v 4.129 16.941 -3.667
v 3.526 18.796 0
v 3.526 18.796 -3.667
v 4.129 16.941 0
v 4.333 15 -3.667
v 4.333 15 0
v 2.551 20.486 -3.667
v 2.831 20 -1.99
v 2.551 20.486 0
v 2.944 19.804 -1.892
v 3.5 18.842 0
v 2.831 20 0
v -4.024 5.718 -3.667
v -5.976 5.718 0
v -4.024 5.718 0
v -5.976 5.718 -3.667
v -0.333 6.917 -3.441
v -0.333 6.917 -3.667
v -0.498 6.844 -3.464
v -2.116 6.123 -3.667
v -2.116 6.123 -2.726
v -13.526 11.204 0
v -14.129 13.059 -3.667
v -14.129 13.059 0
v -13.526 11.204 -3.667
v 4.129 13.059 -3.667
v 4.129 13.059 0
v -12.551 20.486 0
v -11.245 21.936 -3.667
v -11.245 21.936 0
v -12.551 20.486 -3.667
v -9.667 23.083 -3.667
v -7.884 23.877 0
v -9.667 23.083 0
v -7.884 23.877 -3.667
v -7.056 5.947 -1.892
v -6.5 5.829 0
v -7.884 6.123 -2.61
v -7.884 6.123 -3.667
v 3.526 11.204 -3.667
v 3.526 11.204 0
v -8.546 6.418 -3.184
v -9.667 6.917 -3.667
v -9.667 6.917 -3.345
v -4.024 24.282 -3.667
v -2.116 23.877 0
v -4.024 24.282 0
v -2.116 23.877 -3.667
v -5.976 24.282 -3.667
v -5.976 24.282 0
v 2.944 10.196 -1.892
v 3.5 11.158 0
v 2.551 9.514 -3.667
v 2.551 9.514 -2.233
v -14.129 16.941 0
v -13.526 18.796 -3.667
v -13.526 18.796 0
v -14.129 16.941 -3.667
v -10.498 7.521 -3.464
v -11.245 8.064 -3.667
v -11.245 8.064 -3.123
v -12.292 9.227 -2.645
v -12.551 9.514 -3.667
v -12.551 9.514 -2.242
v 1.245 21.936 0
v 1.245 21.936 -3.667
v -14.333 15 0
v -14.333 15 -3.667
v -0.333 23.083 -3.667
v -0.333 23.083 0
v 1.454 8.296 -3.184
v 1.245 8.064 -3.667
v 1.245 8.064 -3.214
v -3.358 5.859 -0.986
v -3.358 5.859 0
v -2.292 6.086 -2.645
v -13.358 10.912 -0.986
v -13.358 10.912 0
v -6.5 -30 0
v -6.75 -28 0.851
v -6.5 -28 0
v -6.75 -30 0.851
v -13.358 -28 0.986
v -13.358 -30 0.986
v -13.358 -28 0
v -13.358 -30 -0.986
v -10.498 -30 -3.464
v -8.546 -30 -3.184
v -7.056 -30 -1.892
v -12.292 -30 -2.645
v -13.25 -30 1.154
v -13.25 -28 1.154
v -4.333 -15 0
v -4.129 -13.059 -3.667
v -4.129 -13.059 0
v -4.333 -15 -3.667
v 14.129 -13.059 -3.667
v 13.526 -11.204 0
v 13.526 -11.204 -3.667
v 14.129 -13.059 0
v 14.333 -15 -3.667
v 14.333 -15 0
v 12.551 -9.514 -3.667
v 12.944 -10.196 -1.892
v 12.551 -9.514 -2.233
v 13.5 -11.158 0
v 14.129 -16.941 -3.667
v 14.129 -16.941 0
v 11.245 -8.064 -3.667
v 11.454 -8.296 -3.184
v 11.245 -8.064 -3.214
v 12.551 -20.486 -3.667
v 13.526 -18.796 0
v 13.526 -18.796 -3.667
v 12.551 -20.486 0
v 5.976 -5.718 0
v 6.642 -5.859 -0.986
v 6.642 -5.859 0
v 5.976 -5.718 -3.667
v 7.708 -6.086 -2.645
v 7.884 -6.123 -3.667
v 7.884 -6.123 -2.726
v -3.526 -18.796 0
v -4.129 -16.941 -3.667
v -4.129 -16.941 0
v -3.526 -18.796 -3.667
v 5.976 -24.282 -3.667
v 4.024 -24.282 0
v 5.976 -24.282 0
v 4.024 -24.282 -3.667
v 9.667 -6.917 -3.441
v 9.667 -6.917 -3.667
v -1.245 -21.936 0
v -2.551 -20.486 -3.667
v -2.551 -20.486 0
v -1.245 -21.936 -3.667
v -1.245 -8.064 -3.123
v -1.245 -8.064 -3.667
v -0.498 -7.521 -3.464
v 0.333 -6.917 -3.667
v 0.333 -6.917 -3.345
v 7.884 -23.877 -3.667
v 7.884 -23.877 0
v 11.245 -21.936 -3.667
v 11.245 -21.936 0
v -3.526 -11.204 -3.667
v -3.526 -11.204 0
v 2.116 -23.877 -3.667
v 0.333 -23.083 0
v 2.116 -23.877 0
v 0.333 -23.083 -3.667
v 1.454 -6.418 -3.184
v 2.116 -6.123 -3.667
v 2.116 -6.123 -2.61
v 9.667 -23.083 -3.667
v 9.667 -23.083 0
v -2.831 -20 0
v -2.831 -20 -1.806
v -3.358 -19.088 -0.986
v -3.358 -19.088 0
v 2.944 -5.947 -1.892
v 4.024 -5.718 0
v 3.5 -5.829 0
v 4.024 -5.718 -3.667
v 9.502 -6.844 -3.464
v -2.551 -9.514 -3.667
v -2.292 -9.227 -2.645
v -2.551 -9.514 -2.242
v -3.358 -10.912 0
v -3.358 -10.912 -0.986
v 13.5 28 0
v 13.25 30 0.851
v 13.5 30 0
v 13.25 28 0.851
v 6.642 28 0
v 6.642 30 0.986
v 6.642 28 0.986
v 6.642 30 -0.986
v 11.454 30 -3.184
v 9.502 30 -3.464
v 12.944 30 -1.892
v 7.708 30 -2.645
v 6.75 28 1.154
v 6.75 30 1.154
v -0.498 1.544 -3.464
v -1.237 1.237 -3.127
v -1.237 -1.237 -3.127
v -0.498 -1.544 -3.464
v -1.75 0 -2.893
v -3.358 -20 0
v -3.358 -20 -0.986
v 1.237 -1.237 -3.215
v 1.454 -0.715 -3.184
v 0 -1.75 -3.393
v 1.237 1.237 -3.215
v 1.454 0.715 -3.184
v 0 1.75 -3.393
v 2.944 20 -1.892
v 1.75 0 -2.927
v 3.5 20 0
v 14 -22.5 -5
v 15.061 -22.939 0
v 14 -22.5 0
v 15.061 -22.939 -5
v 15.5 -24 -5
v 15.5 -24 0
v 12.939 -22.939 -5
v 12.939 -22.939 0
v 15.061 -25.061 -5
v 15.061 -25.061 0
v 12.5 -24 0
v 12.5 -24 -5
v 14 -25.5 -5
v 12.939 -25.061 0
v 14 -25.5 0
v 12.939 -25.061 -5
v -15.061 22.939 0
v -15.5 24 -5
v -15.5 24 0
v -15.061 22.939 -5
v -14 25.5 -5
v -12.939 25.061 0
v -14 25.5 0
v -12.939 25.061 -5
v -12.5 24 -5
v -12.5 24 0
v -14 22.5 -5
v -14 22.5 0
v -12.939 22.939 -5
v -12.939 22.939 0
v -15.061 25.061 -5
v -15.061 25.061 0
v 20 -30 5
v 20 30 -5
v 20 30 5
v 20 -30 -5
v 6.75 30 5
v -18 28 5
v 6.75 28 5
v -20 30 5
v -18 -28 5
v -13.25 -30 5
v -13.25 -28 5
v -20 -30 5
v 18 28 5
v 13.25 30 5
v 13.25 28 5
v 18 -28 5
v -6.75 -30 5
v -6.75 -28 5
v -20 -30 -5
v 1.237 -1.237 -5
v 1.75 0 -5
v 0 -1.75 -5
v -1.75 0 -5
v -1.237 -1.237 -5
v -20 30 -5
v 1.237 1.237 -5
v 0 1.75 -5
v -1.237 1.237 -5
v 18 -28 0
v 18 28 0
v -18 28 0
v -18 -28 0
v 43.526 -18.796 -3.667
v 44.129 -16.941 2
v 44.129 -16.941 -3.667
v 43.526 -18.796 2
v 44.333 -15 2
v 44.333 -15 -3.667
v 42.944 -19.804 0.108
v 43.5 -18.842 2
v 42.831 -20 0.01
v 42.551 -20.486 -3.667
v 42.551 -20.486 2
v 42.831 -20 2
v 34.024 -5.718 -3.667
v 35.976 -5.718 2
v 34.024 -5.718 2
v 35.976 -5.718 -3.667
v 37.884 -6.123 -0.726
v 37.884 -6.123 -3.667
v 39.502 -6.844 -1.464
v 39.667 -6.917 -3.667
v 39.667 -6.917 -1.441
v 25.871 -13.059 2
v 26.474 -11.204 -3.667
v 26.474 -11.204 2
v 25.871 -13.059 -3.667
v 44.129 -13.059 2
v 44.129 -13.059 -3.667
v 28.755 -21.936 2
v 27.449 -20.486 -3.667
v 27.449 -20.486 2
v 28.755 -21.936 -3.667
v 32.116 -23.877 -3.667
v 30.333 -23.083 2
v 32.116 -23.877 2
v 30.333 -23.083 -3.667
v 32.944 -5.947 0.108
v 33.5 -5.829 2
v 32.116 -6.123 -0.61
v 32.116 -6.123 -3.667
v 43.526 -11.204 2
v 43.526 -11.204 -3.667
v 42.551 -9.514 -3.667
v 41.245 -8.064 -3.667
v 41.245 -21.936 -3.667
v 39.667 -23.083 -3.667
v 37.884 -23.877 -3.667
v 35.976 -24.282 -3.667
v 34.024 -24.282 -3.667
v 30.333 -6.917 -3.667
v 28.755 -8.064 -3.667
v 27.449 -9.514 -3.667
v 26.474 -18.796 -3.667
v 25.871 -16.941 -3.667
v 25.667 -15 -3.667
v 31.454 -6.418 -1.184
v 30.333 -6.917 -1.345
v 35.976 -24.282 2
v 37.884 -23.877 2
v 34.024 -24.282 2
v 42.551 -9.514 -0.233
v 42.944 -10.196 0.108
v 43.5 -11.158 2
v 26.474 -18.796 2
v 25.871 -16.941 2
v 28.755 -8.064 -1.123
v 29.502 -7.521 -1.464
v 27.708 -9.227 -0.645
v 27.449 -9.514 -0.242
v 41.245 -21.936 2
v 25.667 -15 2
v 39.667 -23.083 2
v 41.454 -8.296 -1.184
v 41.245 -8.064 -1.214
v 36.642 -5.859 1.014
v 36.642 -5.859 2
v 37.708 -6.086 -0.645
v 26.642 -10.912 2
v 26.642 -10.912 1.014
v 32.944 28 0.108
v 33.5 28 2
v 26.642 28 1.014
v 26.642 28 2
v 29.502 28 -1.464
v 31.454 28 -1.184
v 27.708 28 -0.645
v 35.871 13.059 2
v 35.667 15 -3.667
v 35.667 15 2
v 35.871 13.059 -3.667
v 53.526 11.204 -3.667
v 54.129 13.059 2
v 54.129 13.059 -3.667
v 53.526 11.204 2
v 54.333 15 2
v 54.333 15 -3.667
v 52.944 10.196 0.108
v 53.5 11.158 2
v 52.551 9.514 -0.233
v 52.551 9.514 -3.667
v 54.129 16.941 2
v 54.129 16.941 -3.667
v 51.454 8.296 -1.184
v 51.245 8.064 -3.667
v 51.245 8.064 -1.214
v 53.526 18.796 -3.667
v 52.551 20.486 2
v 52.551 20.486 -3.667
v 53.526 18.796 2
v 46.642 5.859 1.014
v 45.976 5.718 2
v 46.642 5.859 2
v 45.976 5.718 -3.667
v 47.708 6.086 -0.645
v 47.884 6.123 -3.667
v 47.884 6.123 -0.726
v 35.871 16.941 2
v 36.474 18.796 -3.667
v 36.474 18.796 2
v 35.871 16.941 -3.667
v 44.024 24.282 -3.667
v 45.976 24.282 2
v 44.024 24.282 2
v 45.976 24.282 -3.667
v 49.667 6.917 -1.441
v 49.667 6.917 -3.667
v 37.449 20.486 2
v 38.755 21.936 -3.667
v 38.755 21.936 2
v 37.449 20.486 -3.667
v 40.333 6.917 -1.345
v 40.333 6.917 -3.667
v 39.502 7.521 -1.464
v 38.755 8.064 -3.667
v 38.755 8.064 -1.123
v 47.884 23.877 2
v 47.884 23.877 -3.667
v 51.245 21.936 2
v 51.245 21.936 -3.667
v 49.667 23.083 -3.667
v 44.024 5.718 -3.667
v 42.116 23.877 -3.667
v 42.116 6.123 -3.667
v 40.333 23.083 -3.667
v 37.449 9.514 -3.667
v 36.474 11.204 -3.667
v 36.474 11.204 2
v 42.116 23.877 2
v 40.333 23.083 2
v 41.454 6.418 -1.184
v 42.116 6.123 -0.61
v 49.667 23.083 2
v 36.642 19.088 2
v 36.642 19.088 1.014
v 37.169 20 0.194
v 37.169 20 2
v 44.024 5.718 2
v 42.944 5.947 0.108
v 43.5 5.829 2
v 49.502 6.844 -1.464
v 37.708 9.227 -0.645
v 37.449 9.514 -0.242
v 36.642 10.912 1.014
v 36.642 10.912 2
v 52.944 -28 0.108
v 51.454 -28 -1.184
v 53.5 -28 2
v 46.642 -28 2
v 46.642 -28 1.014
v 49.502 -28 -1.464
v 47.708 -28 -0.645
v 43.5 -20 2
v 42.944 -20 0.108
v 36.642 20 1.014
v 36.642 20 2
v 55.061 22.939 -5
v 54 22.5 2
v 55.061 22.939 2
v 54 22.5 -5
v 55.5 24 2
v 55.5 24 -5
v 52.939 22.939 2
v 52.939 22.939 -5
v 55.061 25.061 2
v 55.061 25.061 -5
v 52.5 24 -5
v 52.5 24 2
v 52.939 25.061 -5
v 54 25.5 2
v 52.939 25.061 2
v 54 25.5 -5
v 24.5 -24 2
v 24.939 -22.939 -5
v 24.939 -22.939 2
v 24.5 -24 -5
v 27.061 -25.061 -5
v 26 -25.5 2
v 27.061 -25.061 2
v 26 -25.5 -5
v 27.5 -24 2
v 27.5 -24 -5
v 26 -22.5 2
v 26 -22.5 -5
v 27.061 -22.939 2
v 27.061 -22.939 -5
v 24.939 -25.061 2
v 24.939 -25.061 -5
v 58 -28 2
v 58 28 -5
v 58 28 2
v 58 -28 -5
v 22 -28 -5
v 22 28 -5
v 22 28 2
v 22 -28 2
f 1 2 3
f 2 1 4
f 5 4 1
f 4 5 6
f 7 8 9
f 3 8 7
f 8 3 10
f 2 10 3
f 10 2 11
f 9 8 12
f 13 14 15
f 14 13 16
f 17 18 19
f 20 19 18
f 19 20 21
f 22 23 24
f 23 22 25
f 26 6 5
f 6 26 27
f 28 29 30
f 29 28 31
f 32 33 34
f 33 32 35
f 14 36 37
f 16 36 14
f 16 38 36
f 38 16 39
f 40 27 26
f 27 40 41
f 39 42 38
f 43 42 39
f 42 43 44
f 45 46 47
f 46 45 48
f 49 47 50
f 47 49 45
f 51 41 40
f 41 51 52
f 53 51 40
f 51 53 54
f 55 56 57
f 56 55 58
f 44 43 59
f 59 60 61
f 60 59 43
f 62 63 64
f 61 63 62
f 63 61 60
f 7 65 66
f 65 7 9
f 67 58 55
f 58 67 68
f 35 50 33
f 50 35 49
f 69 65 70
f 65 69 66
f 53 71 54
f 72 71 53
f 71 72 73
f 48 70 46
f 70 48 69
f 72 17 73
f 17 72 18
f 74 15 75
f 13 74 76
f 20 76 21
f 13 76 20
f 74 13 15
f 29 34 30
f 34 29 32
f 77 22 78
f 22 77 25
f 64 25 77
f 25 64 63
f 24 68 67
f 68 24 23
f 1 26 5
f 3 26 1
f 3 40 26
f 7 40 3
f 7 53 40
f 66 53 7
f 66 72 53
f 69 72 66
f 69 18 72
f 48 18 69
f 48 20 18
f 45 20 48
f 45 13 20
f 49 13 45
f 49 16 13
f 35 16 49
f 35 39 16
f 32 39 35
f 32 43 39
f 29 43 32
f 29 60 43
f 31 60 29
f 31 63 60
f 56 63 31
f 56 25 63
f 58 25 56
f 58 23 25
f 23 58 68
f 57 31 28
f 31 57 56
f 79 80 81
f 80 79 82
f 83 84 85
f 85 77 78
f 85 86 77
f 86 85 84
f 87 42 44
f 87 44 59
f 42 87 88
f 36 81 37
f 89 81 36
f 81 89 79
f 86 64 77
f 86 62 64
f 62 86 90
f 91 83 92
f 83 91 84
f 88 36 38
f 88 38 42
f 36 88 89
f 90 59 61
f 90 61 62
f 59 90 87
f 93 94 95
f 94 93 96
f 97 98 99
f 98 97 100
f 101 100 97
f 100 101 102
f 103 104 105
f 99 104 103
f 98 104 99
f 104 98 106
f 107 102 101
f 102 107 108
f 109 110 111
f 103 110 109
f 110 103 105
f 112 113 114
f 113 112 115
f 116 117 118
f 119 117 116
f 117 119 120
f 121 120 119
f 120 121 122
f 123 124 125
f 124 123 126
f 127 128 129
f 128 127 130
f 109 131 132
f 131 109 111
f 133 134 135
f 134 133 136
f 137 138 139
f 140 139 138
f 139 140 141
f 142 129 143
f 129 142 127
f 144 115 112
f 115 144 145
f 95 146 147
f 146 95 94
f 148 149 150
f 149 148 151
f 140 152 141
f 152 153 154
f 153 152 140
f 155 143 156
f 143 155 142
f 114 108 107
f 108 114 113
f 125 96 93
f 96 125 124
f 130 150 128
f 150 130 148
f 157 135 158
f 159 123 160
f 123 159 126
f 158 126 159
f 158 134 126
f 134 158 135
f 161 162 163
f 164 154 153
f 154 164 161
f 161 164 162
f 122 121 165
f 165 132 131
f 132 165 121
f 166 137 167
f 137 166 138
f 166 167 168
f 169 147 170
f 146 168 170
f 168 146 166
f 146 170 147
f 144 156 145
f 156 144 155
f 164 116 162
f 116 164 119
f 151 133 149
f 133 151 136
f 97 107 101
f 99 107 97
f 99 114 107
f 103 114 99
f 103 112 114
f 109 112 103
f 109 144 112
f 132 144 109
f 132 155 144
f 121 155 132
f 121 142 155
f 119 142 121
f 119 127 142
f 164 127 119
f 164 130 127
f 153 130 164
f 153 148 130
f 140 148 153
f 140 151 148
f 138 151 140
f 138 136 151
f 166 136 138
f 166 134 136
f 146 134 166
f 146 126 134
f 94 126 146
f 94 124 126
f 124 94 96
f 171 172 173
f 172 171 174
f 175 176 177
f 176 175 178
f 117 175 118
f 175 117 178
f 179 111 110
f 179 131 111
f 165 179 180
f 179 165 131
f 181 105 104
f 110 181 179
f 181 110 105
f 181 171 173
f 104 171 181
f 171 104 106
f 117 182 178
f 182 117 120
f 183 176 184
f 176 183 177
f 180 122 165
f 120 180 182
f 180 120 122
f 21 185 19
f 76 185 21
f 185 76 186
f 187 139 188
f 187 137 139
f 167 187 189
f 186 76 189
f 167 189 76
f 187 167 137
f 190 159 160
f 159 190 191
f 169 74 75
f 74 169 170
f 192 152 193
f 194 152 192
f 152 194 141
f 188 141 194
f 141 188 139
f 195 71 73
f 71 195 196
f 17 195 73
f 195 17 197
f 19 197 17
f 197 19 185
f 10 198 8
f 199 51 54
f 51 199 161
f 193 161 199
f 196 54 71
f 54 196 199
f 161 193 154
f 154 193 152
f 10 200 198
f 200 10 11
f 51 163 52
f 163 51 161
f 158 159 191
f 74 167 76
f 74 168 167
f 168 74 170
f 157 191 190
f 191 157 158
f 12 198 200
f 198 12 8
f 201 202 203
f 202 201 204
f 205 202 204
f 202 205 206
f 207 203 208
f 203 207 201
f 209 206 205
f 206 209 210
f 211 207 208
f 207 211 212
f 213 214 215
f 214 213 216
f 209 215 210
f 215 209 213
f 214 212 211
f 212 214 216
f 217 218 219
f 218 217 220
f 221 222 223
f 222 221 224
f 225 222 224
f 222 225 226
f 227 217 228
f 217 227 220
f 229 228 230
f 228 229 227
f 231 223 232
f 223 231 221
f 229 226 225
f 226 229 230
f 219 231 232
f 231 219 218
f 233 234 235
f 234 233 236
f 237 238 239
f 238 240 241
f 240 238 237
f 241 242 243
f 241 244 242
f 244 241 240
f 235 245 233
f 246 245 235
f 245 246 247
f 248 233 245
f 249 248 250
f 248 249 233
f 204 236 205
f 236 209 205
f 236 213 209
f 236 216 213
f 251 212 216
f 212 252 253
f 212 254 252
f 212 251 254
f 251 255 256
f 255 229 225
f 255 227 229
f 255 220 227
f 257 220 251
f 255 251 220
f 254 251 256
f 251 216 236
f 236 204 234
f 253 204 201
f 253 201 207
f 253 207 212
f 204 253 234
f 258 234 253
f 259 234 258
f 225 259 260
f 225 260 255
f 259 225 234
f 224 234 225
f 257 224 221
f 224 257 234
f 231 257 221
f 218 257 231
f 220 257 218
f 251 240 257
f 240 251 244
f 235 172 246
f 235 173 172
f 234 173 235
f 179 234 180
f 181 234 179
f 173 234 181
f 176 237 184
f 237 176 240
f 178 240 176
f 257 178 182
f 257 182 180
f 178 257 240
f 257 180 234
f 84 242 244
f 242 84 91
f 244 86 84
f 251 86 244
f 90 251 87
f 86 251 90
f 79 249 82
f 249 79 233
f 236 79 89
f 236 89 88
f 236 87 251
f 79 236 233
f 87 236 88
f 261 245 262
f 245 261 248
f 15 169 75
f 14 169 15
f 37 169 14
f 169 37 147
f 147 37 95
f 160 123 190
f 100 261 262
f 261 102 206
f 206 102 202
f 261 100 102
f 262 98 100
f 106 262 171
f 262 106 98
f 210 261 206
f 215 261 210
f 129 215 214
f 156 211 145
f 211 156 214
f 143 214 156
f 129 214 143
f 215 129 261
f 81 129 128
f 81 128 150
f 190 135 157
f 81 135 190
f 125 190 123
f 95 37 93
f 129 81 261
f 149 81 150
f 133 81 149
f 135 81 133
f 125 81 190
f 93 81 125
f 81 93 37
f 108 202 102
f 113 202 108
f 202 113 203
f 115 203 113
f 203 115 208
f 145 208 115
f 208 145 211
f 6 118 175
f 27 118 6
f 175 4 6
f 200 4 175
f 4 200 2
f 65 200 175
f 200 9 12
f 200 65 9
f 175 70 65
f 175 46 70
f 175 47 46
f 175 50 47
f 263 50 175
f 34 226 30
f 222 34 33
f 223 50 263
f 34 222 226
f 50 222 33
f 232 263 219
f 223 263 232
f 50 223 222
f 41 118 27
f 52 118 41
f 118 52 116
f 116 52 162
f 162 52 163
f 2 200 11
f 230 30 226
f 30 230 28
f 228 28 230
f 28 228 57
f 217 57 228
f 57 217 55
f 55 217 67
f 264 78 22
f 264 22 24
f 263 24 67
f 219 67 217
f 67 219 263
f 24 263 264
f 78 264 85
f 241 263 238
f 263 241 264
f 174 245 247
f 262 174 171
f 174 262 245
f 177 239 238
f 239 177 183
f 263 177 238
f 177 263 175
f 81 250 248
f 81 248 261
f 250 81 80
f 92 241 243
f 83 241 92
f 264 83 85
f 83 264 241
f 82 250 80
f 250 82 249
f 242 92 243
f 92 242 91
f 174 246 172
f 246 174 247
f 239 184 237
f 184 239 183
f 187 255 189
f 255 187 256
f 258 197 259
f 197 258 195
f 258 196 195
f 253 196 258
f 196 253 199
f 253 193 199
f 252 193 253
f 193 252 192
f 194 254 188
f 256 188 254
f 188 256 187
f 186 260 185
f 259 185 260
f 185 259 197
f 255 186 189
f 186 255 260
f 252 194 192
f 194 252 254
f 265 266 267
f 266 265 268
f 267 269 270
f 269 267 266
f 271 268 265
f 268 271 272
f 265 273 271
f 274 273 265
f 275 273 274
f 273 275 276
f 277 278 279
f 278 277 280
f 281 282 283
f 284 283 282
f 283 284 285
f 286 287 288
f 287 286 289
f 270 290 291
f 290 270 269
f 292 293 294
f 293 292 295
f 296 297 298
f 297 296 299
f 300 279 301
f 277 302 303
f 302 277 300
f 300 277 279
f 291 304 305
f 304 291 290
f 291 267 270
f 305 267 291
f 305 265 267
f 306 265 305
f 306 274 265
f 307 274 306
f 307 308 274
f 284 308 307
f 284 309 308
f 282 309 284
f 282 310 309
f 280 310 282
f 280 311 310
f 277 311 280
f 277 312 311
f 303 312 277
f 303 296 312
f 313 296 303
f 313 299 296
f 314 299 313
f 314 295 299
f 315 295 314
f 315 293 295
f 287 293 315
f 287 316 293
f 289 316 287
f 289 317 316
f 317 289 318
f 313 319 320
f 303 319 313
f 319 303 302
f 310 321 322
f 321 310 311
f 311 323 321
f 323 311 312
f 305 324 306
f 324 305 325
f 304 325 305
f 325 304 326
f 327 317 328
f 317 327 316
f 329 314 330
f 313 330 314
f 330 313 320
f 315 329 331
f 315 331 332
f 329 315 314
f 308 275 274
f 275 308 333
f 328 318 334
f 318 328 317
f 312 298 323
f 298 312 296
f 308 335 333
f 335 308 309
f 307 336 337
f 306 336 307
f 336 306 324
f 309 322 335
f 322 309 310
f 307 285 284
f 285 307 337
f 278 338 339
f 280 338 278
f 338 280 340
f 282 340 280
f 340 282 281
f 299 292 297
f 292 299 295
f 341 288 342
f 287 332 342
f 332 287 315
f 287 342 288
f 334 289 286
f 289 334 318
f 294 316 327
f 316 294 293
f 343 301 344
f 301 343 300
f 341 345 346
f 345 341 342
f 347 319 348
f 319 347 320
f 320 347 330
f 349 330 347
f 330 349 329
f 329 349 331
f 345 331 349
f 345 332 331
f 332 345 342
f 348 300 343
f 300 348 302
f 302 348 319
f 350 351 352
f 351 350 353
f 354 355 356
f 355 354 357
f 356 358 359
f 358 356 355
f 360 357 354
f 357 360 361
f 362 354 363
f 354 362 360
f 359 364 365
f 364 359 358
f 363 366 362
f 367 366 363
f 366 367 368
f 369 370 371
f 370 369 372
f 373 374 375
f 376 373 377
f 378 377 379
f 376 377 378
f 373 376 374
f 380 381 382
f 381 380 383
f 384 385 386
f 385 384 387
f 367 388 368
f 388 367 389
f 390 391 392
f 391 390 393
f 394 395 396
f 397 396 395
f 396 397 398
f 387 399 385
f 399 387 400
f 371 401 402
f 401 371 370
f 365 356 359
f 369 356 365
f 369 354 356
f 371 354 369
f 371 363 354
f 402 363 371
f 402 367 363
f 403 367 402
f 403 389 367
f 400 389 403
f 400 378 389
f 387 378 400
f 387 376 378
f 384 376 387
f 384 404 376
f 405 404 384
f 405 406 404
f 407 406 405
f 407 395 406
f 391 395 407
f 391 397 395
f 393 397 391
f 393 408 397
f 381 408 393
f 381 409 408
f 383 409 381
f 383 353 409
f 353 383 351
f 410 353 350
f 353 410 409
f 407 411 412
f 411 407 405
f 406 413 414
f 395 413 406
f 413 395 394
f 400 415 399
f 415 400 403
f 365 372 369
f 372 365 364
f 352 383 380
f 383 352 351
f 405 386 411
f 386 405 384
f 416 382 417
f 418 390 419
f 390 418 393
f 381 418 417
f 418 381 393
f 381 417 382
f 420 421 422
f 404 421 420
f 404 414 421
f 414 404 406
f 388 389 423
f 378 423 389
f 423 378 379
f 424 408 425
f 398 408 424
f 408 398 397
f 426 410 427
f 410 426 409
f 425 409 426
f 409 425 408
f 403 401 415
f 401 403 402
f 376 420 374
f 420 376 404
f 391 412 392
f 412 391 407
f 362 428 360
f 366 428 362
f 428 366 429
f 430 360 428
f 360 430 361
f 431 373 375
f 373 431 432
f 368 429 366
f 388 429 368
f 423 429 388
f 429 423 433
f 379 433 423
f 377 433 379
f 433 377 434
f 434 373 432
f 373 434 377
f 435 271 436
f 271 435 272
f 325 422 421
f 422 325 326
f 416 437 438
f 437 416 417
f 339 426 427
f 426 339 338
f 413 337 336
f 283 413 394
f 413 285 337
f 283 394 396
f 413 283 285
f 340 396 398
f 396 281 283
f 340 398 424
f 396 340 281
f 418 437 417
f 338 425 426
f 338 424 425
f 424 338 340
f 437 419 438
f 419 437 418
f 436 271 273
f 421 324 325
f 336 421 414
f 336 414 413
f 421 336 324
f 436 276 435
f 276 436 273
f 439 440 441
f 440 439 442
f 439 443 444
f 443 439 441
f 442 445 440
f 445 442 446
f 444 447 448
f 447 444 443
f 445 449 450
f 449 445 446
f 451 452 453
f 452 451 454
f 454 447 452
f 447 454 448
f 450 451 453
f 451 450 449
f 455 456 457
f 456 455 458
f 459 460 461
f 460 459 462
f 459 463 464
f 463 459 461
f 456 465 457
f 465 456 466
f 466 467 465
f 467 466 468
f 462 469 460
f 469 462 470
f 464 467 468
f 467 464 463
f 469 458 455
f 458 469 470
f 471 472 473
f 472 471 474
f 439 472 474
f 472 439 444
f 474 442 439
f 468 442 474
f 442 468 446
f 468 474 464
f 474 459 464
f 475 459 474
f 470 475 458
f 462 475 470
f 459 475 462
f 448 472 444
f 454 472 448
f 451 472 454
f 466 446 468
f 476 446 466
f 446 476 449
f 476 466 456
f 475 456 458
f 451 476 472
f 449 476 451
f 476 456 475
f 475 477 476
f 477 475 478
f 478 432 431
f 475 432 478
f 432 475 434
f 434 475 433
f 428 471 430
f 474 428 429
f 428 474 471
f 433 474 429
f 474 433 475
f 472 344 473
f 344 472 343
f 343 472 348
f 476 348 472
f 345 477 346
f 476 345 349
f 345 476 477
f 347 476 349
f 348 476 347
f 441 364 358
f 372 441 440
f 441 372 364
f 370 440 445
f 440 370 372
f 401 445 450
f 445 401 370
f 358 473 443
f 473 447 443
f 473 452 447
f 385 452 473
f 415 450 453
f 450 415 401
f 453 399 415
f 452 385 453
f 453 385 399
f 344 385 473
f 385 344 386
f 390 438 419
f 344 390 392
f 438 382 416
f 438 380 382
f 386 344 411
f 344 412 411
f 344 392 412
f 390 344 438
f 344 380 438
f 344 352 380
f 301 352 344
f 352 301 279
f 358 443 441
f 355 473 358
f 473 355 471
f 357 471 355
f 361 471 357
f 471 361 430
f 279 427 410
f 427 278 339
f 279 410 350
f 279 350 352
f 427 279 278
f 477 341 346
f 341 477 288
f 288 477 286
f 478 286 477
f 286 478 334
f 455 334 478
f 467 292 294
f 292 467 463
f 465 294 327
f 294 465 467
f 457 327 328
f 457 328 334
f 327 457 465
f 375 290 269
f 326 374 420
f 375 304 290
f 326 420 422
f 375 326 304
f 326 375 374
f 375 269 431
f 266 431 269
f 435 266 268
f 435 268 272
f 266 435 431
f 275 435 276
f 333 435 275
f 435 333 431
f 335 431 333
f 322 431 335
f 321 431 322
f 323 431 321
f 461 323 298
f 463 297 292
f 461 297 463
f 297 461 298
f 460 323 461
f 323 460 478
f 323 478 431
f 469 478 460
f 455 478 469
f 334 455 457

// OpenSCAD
xsize = 40;
ysize = 60;
width = 14;
dia = 3.5;
module shole() {
	 translate([-xsize/8,ysize/4,1])
	  cylinder(r=2*width/3,h=2*width/3,center=true);
	 translate([-xsize/4,-ysize/4,0])
     rotate([90,0,0])
	   cylinder(r=dia, h = ysize, center=true);

	 translate([xsize/8,-ysize/4,1])
	  cylinder(r=2*width/3,h=2*width/3,center=true);
	 translate([xsize/4,ysize/4,0])
     rotate([90,0,0])
	   cylinder(r=dia, h = ysize, center=true);
    rotate([90,0,0])
	  cylinder(r=dia,h=2*ysize/3,center=true);


//upper right
	translate([xsize/2 - 6, 6-ysize/2, 0])
		cylinder(r=1.5,h=width+2,center=true,$fn=8);
//lower left
	translate([6-xsize/2, ysize/2 - 6, 0])
		cylinder(r=1.5,h=width+2,center=true,$fn=8);
}

module top() {

	difference() {
		cube([xsize,ysize,10],center=true);
	   shole();
	   translate([0,0,width/2])
	     cube([xsize-4,ysize-4,width],center=true);
   translate([10-xsize/2,-ysize/2,4]) cube([6.5,7,7],center=true);
   translate([xsize/2-10, ysize/2,4]) cube([6.5,7,7],center=true);
	//optical hole
		cylinder(r=dia/2,h=width+2,center=true,$fn=8);
	}
}


module bottom() {
	difference() {
		cube([xsize-4,ysize-4,width],center=true);
	   shole();
	   translate([0,0,-width/2])
	     cube([xsize,ysize,width],center=true);

	}
}

top();
translate([xsize,0,2])
 rotate([180,0,0])
  bottom();
